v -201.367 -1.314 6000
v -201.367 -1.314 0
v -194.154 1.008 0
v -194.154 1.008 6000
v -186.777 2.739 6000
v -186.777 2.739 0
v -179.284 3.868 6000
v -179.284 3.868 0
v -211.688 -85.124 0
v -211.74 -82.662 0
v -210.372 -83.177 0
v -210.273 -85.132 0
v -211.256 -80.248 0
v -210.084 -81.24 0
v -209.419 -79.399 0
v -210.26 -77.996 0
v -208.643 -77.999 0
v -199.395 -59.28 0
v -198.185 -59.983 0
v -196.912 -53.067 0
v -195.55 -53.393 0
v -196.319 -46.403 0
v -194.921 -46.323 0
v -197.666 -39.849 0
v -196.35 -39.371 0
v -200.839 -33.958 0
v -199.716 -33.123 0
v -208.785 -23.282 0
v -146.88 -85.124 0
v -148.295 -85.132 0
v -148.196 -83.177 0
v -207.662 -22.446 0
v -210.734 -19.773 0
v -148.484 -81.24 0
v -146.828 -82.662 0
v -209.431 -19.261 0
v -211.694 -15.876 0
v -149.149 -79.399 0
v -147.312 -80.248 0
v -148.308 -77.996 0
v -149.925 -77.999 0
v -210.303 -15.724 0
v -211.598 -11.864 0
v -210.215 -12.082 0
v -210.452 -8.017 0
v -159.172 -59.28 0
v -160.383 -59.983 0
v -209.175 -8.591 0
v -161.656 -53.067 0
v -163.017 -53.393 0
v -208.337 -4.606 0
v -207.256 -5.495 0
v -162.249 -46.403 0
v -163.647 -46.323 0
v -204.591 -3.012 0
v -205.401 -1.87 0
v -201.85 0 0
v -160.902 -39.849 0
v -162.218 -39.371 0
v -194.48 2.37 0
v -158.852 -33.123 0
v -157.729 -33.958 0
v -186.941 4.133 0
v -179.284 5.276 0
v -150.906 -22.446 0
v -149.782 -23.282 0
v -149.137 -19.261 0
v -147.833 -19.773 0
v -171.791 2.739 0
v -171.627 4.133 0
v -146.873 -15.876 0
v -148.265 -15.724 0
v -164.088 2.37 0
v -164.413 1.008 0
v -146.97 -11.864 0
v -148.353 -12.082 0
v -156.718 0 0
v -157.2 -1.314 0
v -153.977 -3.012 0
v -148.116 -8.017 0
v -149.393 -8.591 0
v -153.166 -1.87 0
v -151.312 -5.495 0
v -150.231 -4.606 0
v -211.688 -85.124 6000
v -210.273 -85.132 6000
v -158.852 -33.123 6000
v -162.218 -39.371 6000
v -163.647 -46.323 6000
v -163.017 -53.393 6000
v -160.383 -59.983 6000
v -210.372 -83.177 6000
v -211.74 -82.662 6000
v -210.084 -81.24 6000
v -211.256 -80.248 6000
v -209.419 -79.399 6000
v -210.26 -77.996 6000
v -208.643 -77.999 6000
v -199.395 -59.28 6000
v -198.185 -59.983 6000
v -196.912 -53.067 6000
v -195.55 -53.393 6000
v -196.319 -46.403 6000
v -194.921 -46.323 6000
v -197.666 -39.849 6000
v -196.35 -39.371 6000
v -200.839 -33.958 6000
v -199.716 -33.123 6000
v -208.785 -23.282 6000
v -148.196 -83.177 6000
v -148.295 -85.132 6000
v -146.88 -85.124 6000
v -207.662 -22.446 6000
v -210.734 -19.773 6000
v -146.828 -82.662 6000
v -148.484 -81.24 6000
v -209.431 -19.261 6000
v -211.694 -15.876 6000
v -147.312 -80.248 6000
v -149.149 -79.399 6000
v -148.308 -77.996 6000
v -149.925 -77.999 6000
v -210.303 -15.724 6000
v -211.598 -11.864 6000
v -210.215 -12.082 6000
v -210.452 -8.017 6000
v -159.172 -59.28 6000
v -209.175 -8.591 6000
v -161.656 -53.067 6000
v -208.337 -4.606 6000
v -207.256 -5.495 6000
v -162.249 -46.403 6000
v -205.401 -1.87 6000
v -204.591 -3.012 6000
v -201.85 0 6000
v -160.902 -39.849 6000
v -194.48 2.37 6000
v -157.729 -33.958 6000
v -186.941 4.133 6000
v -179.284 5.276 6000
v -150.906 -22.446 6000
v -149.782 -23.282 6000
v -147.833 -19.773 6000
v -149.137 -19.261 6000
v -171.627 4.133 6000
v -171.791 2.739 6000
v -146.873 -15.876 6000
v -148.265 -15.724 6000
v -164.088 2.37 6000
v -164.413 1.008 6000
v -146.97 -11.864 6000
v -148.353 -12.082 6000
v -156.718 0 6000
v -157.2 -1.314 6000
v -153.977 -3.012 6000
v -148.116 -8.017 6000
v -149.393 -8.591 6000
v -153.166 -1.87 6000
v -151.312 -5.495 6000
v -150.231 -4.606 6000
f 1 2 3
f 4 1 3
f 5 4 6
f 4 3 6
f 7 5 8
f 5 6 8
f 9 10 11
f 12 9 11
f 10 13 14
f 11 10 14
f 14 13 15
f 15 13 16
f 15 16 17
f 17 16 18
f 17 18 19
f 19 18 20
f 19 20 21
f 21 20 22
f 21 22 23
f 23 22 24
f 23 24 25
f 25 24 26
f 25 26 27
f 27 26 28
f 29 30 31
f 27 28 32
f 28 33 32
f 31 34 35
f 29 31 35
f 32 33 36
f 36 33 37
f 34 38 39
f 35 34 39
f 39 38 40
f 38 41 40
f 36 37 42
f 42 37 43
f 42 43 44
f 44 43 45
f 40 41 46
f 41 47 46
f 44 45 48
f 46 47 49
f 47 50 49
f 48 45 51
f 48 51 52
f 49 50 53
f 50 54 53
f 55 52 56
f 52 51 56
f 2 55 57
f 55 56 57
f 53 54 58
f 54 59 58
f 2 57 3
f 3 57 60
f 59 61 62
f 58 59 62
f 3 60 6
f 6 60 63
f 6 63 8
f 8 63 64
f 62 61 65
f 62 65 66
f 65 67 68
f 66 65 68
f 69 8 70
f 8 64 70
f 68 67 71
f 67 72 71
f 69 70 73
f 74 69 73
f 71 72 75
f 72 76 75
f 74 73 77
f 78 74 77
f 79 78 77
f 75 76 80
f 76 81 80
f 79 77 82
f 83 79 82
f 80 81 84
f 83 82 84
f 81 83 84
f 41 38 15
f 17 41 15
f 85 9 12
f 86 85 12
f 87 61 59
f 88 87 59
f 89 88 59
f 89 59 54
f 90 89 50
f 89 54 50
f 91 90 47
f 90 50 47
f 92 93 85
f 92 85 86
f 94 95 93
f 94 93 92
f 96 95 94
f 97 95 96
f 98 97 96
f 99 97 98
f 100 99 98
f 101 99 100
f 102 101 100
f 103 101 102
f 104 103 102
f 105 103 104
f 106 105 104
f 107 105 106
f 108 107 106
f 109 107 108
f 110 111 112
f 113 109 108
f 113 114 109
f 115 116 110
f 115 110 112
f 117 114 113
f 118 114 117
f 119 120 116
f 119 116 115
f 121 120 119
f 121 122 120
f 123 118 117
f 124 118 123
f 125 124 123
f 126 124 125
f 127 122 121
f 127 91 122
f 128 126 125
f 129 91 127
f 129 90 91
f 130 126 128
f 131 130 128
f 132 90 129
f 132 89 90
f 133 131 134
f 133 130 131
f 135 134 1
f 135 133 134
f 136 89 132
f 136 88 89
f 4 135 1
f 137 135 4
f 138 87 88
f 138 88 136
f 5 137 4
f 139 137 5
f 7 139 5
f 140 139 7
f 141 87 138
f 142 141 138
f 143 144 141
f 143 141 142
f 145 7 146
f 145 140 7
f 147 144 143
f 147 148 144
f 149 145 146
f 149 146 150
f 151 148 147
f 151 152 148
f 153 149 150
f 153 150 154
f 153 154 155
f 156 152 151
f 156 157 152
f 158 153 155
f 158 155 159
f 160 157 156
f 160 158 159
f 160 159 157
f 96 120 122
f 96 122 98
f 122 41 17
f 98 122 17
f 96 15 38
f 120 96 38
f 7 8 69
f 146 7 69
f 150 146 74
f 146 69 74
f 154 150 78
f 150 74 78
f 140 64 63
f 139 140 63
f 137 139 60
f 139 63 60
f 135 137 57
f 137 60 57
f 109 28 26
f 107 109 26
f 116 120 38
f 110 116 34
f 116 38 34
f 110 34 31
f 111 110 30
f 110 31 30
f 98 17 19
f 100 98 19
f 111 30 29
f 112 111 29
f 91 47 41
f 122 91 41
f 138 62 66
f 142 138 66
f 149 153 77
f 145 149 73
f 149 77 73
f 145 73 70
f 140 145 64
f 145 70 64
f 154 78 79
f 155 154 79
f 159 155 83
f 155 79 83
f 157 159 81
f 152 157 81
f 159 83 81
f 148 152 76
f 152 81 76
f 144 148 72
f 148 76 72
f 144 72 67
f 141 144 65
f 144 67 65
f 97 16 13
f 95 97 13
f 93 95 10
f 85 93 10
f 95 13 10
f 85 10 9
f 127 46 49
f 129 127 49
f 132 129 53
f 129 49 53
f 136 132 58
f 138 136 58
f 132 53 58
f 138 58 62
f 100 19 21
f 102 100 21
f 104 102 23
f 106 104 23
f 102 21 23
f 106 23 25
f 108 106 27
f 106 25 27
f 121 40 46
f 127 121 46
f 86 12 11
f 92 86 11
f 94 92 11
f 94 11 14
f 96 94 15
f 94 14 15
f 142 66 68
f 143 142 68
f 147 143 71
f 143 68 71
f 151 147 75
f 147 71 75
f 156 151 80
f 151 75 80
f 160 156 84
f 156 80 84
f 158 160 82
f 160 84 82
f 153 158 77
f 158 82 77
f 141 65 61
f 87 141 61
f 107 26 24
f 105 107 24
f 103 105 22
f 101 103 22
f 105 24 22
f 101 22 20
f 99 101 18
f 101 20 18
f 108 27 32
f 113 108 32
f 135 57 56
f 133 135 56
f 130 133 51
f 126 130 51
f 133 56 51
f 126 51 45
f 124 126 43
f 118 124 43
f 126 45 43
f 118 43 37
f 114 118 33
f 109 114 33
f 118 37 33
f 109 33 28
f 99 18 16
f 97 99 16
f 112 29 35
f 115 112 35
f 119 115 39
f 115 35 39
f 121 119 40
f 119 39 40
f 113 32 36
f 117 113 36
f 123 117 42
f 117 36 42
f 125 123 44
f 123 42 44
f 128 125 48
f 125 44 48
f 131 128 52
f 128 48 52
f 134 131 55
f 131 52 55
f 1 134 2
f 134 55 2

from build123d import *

# Parameters (mm, degrees)
F1_DEPTH = 6000


with BuildPart() as f1:
    # F0 (on Top) → F1 (new body)
    with BuildSketch(Plane.XY):
        with BuildLine():
            ThreePointArc((-200.838676, -33.958443), (-196.318878, -46.40292), (-199.395395, -59.280367))
            Line((-199.395395, -59.280367), (-210.259705, -77.995759))
            ThreePointArc((-210.259705, -77.995759), (-211.564087, -81.441739), (-211.688047, -85.124241))
            Line((-211.688047, -85.124241), (-210.273082, -85.132475))
            ThreePointArc((-210.273082, -85.132475), (-210.275986, -82.201444), (-209.418595, -79.398618))
            Line((-209.418595, -79.398618), (-149.149142, -79.398618))
            ThreePointArc((-149.149142, -79.398618), (-148.291751, -82.201444), (-148.294654, -85.132475))
            Line((-148.294654, -85.132475), (-146.879689, -85.124241))
            ThreePointArc((-146.879689, -85.124241), (-147.00365, -81.441739), (-148.308032, -77.995759))
            Line((-148.308032, -77.995759), (-159.172342, -59.280367))
            ThreePointArc((-159.172342, -59.280367), (-162.248858, -46.40292), (-157.729061, -33.958443))
            Line((-157.729061, -33.958443), (-149.78248, -23.281573))
            ThreePointArc((-149.78248, -23.281573), (-147.414761, -9.902559), (-156.717633, 0))
            ThreePointArc((-156.717633, 0), (-167.839274, 3.328572), (-179.283868, 5.275759))
            ThreePointArc((-179.283868, 5.275759), (-190.728463, 3.328572), (-201.850104, 0))
            ThreePointArc((-201.850104, 0), (-211.152975, -9.902559), (-208.785256, -23.281573))
            Line((-208.785256, -23.281573), (-200.838676, -33.958443))
        make_face()
        with BuildLine():
            Line((-208.642574, -77.998618), (-198.184614, -59.983226))
            ThreePointArc((-198.184614, -59.983226), (-194.921147, -46.323253), (-199.7156, -33.12256))
            Line((-199.7156, -33.12256), (-207.66218, -22.44569))
            ThreePointArc((-207.66218, -22.44569), (-209.811238, -10.302238), (-201.367494, -1.314187))
            ThreePointArc((-201.367494, -1.314187), (-190.483231, 1.948122), (-179.283868, 3.867525))
            ThreePointArc((-179.283868, 3.867525), (-168.084505, 1.948122), (-157.200243, -1.314187))
            ThreePointArc((-157.200243, -1.314187), (-148.756498, -10.302238), (-150.905556, -22.44569))
            Line((-150.905556, -22.44569), (-158.852137, -33.12256))
            ThreePointArc((-158.852137, -33.12256), (-163.64659, -46.323253), (-160.383122, -59.983226))
            Line((-160.383122, -59.983226), (-149.925163, -77.998618))
            Line((-149.925163, -77.998618), (-208.642574, -77.998618))
        make_face(mode=Mode.SUBTRACT)
    extrude(amount=F1_DEPTH)


solid = f1.part
